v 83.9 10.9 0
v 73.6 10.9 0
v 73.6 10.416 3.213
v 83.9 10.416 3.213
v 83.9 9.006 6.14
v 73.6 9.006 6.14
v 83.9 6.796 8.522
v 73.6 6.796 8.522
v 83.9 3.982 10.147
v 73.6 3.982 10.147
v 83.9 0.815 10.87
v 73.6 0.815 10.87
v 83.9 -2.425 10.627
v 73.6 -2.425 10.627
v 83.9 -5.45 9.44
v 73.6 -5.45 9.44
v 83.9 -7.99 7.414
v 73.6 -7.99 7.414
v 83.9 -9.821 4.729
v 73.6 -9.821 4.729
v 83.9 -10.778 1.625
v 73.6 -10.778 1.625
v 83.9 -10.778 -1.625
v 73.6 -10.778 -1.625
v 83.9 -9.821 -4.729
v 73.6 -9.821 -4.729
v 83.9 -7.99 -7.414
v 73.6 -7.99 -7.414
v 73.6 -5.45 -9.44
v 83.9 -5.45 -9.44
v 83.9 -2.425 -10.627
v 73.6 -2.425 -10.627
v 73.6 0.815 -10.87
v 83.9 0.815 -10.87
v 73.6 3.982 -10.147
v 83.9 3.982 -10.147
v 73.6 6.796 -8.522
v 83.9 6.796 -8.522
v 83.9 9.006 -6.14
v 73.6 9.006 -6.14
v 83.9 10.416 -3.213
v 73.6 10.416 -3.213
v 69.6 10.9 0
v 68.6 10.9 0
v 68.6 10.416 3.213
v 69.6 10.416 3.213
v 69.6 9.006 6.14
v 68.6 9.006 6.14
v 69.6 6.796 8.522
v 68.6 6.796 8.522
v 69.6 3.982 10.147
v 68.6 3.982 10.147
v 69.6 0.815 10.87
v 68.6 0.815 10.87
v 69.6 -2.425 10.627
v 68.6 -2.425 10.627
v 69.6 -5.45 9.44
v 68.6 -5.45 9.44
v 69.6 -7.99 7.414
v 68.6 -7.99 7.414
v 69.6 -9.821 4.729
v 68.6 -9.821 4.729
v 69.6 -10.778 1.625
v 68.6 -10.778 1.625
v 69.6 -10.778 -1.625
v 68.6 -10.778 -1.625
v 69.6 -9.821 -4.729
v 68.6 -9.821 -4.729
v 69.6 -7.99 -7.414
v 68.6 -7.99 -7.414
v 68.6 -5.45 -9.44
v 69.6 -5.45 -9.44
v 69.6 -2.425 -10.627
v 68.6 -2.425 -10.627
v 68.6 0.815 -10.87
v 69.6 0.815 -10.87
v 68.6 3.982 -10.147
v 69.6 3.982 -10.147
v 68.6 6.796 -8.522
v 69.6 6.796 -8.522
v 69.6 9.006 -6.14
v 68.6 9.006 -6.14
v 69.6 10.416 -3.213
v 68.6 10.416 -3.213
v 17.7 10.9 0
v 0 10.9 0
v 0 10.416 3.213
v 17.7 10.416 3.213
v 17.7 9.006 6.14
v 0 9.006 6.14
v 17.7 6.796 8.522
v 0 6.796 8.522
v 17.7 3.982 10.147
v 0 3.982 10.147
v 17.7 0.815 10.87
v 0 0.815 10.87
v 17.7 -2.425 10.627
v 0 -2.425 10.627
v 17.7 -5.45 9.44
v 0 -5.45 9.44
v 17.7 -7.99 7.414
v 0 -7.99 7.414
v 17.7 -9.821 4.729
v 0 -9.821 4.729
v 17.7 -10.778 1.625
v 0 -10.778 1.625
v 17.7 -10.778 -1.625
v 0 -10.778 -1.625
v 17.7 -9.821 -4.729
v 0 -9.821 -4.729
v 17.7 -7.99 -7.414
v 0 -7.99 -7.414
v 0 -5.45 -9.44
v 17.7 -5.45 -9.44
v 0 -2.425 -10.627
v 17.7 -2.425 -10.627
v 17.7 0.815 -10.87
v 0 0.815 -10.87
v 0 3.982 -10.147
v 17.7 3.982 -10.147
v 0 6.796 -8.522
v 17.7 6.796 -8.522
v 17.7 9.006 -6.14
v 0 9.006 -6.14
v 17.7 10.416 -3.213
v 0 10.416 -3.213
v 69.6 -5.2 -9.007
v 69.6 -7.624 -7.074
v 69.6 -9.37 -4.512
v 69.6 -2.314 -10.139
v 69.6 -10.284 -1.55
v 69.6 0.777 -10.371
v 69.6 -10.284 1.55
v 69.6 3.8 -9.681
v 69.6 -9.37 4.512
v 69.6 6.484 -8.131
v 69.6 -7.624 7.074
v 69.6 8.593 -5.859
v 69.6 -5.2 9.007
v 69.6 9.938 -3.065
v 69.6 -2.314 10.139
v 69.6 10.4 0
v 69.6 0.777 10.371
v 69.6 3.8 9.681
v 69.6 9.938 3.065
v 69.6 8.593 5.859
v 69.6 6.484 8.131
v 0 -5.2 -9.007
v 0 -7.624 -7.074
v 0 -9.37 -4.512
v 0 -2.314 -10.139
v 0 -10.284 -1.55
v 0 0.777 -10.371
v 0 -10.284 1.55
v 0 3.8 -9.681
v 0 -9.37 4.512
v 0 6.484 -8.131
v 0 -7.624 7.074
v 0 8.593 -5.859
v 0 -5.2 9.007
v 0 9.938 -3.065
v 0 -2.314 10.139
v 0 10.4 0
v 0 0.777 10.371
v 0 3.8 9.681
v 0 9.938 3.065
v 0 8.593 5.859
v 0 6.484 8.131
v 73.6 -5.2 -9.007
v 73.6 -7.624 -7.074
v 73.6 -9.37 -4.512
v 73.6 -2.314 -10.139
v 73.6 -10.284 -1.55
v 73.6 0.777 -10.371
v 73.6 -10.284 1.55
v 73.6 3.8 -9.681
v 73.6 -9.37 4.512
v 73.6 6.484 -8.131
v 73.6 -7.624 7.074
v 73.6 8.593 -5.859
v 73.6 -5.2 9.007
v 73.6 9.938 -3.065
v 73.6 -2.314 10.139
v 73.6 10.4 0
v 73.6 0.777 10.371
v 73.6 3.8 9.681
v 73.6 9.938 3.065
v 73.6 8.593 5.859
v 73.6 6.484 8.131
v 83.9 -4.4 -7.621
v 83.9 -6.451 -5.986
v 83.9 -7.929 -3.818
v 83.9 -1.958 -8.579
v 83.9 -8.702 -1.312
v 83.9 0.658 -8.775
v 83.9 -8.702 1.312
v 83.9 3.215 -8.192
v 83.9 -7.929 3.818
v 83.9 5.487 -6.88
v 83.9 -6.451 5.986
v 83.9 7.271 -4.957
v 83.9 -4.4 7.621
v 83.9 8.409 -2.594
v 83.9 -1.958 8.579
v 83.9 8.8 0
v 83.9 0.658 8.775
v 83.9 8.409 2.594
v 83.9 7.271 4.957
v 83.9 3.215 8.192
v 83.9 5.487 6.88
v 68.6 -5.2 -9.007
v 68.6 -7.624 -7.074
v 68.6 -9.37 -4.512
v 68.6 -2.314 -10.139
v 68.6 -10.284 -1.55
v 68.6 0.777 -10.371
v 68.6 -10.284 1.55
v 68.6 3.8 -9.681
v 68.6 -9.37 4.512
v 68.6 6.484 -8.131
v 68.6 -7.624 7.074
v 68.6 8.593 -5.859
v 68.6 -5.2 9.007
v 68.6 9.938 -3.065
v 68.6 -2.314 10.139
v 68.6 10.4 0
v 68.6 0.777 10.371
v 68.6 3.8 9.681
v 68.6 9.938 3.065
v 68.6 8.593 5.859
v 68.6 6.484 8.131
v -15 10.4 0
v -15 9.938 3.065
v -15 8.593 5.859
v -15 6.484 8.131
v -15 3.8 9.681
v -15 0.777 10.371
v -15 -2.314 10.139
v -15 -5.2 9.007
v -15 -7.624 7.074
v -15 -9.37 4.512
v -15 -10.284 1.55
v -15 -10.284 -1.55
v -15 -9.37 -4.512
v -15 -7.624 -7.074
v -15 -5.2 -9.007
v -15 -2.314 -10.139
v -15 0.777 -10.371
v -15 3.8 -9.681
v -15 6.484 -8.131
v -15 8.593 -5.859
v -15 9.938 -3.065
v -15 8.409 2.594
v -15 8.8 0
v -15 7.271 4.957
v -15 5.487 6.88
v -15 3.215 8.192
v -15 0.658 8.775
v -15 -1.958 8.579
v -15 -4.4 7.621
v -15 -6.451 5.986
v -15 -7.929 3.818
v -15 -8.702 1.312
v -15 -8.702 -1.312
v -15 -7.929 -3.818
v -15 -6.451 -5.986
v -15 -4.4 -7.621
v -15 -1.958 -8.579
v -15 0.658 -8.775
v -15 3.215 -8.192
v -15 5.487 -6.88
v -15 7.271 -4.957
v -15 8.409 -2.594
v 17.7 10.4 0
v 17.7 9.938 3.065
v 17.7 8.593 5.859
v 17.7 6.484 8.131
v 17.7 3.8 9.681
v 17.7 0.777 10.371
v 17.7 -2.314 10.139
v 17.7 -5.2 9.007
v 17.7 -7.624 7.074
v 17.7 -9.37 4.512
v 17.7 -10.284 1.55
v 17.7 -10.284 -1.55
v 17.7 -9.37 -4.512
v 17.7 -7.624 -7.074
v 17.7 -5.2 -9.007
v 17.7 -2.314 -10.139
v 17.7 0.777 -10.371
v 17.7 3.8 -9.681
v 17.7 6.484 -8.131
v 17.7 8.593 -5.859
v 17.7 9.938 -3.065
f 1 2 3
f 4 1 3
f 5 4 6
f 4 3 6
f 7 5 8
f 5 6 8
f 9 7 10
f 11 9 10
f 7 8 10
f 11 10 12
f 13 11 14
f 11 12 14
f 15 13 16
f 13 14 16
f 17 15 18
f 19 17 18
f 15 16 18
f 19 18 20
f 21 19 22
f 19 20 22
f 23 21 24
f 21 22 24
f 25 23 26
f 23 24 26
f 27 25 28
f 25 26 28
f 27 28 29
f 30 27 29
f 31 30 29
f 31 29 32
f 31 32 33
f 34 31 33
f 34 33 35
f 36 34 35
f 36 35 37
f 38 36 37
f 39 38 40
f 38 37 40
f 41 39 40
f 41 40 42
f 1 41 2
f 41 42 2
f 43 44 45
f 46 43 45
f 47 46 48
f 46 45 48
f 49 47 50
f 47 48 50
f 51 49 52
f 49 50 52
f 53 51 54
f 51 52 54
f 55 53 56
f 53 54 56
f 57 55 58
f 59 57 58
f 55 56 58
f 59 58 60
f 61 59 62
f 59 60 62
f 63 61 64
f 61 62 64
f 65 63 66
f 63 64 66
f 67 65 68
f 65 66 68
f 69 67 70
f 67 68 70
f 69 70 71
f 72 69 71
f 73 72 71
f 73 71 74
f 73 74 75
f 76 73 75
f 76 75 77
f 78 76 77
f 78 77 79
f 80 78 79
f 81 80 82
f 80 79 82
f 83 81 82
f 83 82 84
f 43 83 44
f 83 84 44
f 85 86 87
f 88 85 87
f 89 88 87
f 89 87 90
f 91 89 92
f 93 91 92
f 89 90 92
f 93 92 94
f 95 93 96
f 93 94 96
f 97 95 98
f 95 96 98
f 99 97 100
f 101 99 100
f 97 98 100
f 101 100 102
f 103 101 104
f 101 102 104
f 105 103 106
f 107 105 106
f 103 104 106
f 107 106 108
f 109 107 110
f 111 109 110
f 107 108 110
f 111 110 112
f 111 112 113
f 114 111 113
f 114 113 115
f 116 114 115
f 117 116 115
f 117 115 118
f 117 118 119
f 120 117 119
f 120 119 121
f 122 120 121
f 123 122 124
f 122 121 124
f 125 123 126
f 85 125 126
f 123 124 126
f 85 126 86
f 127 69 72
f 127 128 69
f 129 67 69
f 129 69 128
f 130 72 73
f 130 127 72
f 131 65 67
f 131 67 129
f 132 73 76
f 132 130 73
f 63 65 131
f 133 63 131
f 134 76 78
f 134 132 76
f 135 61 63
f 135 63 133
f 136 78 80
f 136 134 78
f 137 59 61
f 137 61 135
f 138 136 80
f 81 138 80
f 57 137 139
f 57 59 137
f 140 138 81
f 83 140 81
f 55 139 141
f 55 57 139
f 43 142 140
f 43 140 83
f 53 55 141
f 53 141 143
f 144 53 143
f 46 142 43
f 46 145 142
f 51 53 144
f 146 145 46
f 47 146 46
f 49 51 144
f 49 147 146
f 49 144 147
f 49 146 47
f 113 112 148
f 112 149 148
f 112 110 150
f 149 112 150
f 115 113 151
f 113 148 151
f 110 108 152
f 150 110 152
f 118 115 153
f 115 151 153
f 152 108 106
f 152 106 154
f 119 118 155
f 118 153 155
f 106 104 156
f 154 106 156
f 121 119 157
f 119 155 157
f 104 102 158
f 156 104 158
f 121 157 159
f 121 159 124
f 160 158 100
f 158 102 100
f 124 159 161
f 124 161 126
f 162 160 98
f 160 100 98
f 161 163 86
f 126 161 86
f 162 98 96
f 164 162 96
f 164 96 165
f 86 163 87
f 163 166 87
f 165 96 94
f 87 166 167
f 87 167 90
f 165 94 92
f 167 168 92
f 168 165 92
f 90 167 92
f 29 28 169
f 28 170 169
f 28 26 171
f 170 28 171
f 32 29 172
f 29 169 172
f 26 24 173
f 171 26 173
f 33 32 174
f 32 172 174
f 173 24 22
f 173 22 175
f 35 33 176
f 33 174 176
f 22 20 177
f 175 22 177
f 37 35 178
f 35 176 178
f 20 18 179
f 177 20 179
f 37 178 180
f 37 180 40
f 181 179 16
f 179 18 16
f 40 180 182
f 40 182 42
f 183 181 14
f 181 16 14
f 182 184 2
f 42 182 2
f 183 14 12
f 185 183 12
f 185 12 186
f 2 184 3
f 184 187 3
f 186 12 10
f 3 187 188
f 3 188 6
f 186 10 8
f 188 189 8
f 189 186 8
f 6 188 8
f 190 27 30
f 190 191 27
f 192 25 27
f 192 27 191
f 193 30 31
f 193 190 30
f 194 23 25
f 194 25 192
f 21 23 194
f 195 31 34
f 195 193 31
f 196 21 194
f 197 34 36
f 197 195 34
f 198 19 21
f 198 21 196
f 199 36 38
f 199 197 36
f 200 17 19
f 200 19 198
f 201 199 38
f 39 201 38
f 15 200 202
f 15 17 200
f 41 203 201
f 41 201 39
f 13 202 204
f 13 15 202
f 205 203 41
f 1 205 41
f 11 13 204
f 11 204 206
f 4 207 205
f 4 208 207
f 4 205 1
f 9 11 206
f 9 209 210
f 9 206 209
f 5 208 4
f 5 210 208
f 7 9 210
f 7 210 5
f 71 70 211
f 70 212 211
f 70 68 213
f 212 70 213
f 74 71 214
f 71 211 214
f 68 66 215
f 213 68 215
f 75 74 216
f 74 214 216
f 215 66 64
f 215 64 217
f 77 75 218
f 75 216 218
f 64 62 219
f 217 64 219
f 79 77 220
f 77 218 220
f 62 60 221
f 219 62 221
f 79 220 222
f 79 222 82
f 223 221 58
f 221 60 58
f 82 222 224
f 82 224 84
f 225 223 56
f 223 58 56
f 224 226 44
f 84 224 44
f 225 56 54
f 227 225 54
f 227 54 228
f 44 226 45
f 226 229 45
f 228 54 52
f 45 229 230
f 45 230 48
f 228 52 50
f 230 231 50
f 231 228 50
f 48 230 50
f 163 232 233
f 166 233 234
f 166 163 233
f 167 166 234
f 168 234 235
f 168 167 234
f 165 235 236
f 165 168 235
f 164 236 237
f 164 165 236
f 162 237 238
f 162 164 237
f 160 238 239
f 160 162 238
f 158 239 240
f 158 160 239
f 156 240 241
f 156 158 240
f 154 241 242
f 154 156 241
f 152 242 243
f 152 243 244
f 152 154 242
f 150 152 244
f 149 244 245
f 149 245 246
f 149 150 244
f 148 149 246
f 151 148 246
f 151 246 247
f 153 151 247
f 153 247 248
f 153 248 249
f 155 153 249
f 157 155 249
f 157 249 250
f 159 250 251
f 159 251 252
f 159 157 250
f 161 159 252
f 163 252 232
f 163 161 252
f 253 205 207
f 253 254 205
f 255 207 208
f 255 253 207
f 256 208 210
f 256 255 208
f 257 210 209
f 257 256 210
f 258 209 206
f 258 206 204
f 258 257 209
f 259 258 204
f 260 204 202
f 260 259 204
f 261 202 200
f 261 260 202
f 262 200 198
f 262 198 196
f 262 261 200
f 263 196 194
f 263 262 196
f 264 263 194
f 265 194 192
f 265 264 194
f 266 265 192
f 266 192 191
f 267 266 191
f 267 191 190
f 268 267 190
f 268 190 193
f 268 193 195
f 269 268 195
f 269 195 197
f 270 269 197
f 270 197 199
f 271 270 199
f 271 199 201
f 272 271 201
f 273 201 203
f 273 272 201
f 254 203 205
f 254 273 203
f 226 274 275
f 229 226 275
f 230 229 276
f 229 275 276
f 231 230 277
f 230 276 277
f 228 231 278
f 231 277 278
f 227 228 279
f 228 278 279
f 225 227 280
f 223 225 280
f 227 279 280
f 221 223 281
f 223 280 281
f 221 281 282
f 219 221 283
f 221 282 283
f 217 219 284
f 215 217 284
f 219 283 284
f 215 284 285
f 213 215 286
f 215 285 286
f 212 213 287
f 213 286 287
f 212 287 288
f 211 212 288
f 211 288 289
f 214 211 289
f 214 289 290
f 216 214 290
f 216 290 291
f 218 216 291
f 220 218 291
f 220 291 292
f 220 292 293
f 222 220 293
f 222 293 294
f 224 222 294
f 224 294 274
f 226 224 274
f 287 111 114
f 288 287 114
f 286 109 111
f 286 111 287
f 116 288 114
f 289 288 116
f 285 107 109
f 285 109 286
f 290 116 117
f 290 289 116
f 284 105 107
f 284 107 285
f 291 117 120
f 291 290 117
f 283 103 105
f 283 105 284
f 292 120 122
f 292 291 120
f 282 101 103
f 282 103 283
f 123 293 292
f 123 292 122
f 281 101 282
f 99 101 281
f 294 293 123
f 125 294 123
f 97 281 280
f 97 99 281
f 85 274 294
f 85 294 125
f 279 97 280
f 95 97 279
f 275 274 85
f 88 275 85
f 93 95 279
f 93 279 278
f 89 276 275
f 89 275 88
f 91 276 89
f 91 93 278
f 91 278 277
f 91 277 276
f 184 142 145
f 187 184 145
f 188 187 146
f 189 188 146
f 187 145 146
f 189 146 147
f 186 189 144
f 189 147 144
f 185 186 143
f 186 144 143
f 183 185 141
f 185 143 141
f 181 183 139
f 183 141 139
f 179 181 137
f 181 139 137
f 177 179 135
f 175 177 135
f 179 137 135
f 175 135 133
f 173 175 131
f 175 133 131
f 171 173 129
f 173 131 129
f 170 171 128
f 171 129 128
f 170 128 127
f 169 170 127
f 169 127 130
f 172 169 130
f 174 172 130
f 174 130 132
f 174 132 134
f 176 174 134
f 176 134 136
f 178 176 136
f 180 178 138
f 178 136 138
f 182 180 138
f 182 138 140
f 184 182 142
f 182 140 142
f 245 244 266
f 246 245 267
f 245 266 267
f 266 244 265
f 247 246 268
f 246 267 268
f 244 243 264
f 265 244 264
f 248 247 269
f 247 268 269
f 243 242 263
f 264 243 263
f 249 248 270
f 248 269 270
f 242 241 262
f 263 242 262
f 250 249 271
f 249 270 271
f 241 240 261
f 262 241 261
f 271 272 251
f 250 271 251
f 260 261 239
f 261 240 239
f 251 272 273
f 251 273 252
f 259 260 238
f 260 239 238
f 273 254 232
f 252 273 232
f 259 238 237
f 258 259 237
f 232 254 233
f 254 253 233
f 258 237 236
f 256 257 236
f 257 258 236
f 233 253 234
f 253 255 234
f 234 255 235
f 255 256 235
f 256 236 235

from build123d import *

# Parameters (mm, degrees)
F0_R      = 10.4
F0_R_2    = 8.8
F1_DEPTH  = 13.1
F2_DEPTH  = 25
F3_DEPTH  = 1.9
F4_R      = 10.9
F4_R_2    = 10.4
F5_DEPTH  = 17.7
F6_DEPTH  = 68.6
F7_R      = 10.9
F7_R_2    = 10.4
F7_R_3    = 8.8
F8_DEPTH  = 1
F9_R      = 10.4
F9_R_2    = 8.8
F10_DEPTH = 4
F11_R     = 10.9
F11_R_2   = 10.4
F11_R_3   = 8.8
F12_DEPTH = 10.3


with BuildPart() as f1:
    # F0 (on Right) → F1 (new body)
    with BuildSketch(Plane.YZ):
        Circle(F0_R)
        Circle(F0_R_2, mode=Mode.SUBTRACT)
        Circle(F0_R_2)
    extrude(amount=-F1_DEPTH)

    # F0 (on Right) → F2 (cut)
    with BuildSketch(Plane.YZ):
        Circle(F0_R_2)
    extrude(amount=-F2_DEPTH, mode=Mode.SUBTRACT)

    # F3 (add): a face of the model
    f3_faces = [f1.faces().sort_by_distance(p)[0] for p in [
        (-13.1, -10.105843579, 0),
    ]]
    extrude(f3_faces, amount=F3_DEPTH)

    # F4 (on face) + F0 (on Right) → F5 (join)
    with BuildSketch(Plane.YZ):
        Circle(F4_R)
        Circle(F4_R_2, mode=Mode.SUBTRACT)
    with BuildSketch(Plane.YZ):
        Circle(F0_R)
        Circle(F0_R_2, mode=Mode.SUBTRACT)
    extrude(amount=F5_DEPTH)

    # F0 (on Right) → F6 (join)
    with BuildSketch(Plane.YZ):
        Circle(F0_R)
        Circle(F0_R_2, mode=Mode.SUBTRACT)
    extrude(amount=F6_DEPTH)

    # F7 (on face) → F8 (join)
    with BuildSketch(Plane.YZ.offset(68.6)):
        Circle(F7_R)
        Circle(F7_R_2, mode=Mode.SUBTRACT)
        Circle(F7_R_2)
        Circle(F7_R_3, mode=Mode.SUBTRACT)
    extrude(amount=F8_DEPTH)

    # F9 (on face) → F10 (join)
    with BuildSketch(Plane.YZ.offset(69.6)):
        Circle(F9_R)
        Circle(F9_R_2, mode=Mode.SUBTRACT)
    extrude(amount=F10_DEPTH)

    # F11 (on face) → F12 (join)
    with BuildSketch(Plane.YZ.offset(73.6)):
        Circle(F11_R)
        Circle(F11_R_2, mode=Mode.SUBTRACT)
        Circle(F11_R_2)
        Circle(F11_R_3, mode=Mode.SUBTRACT)
    extrude(amount=F12_DEPTH)


solid = f1.part
